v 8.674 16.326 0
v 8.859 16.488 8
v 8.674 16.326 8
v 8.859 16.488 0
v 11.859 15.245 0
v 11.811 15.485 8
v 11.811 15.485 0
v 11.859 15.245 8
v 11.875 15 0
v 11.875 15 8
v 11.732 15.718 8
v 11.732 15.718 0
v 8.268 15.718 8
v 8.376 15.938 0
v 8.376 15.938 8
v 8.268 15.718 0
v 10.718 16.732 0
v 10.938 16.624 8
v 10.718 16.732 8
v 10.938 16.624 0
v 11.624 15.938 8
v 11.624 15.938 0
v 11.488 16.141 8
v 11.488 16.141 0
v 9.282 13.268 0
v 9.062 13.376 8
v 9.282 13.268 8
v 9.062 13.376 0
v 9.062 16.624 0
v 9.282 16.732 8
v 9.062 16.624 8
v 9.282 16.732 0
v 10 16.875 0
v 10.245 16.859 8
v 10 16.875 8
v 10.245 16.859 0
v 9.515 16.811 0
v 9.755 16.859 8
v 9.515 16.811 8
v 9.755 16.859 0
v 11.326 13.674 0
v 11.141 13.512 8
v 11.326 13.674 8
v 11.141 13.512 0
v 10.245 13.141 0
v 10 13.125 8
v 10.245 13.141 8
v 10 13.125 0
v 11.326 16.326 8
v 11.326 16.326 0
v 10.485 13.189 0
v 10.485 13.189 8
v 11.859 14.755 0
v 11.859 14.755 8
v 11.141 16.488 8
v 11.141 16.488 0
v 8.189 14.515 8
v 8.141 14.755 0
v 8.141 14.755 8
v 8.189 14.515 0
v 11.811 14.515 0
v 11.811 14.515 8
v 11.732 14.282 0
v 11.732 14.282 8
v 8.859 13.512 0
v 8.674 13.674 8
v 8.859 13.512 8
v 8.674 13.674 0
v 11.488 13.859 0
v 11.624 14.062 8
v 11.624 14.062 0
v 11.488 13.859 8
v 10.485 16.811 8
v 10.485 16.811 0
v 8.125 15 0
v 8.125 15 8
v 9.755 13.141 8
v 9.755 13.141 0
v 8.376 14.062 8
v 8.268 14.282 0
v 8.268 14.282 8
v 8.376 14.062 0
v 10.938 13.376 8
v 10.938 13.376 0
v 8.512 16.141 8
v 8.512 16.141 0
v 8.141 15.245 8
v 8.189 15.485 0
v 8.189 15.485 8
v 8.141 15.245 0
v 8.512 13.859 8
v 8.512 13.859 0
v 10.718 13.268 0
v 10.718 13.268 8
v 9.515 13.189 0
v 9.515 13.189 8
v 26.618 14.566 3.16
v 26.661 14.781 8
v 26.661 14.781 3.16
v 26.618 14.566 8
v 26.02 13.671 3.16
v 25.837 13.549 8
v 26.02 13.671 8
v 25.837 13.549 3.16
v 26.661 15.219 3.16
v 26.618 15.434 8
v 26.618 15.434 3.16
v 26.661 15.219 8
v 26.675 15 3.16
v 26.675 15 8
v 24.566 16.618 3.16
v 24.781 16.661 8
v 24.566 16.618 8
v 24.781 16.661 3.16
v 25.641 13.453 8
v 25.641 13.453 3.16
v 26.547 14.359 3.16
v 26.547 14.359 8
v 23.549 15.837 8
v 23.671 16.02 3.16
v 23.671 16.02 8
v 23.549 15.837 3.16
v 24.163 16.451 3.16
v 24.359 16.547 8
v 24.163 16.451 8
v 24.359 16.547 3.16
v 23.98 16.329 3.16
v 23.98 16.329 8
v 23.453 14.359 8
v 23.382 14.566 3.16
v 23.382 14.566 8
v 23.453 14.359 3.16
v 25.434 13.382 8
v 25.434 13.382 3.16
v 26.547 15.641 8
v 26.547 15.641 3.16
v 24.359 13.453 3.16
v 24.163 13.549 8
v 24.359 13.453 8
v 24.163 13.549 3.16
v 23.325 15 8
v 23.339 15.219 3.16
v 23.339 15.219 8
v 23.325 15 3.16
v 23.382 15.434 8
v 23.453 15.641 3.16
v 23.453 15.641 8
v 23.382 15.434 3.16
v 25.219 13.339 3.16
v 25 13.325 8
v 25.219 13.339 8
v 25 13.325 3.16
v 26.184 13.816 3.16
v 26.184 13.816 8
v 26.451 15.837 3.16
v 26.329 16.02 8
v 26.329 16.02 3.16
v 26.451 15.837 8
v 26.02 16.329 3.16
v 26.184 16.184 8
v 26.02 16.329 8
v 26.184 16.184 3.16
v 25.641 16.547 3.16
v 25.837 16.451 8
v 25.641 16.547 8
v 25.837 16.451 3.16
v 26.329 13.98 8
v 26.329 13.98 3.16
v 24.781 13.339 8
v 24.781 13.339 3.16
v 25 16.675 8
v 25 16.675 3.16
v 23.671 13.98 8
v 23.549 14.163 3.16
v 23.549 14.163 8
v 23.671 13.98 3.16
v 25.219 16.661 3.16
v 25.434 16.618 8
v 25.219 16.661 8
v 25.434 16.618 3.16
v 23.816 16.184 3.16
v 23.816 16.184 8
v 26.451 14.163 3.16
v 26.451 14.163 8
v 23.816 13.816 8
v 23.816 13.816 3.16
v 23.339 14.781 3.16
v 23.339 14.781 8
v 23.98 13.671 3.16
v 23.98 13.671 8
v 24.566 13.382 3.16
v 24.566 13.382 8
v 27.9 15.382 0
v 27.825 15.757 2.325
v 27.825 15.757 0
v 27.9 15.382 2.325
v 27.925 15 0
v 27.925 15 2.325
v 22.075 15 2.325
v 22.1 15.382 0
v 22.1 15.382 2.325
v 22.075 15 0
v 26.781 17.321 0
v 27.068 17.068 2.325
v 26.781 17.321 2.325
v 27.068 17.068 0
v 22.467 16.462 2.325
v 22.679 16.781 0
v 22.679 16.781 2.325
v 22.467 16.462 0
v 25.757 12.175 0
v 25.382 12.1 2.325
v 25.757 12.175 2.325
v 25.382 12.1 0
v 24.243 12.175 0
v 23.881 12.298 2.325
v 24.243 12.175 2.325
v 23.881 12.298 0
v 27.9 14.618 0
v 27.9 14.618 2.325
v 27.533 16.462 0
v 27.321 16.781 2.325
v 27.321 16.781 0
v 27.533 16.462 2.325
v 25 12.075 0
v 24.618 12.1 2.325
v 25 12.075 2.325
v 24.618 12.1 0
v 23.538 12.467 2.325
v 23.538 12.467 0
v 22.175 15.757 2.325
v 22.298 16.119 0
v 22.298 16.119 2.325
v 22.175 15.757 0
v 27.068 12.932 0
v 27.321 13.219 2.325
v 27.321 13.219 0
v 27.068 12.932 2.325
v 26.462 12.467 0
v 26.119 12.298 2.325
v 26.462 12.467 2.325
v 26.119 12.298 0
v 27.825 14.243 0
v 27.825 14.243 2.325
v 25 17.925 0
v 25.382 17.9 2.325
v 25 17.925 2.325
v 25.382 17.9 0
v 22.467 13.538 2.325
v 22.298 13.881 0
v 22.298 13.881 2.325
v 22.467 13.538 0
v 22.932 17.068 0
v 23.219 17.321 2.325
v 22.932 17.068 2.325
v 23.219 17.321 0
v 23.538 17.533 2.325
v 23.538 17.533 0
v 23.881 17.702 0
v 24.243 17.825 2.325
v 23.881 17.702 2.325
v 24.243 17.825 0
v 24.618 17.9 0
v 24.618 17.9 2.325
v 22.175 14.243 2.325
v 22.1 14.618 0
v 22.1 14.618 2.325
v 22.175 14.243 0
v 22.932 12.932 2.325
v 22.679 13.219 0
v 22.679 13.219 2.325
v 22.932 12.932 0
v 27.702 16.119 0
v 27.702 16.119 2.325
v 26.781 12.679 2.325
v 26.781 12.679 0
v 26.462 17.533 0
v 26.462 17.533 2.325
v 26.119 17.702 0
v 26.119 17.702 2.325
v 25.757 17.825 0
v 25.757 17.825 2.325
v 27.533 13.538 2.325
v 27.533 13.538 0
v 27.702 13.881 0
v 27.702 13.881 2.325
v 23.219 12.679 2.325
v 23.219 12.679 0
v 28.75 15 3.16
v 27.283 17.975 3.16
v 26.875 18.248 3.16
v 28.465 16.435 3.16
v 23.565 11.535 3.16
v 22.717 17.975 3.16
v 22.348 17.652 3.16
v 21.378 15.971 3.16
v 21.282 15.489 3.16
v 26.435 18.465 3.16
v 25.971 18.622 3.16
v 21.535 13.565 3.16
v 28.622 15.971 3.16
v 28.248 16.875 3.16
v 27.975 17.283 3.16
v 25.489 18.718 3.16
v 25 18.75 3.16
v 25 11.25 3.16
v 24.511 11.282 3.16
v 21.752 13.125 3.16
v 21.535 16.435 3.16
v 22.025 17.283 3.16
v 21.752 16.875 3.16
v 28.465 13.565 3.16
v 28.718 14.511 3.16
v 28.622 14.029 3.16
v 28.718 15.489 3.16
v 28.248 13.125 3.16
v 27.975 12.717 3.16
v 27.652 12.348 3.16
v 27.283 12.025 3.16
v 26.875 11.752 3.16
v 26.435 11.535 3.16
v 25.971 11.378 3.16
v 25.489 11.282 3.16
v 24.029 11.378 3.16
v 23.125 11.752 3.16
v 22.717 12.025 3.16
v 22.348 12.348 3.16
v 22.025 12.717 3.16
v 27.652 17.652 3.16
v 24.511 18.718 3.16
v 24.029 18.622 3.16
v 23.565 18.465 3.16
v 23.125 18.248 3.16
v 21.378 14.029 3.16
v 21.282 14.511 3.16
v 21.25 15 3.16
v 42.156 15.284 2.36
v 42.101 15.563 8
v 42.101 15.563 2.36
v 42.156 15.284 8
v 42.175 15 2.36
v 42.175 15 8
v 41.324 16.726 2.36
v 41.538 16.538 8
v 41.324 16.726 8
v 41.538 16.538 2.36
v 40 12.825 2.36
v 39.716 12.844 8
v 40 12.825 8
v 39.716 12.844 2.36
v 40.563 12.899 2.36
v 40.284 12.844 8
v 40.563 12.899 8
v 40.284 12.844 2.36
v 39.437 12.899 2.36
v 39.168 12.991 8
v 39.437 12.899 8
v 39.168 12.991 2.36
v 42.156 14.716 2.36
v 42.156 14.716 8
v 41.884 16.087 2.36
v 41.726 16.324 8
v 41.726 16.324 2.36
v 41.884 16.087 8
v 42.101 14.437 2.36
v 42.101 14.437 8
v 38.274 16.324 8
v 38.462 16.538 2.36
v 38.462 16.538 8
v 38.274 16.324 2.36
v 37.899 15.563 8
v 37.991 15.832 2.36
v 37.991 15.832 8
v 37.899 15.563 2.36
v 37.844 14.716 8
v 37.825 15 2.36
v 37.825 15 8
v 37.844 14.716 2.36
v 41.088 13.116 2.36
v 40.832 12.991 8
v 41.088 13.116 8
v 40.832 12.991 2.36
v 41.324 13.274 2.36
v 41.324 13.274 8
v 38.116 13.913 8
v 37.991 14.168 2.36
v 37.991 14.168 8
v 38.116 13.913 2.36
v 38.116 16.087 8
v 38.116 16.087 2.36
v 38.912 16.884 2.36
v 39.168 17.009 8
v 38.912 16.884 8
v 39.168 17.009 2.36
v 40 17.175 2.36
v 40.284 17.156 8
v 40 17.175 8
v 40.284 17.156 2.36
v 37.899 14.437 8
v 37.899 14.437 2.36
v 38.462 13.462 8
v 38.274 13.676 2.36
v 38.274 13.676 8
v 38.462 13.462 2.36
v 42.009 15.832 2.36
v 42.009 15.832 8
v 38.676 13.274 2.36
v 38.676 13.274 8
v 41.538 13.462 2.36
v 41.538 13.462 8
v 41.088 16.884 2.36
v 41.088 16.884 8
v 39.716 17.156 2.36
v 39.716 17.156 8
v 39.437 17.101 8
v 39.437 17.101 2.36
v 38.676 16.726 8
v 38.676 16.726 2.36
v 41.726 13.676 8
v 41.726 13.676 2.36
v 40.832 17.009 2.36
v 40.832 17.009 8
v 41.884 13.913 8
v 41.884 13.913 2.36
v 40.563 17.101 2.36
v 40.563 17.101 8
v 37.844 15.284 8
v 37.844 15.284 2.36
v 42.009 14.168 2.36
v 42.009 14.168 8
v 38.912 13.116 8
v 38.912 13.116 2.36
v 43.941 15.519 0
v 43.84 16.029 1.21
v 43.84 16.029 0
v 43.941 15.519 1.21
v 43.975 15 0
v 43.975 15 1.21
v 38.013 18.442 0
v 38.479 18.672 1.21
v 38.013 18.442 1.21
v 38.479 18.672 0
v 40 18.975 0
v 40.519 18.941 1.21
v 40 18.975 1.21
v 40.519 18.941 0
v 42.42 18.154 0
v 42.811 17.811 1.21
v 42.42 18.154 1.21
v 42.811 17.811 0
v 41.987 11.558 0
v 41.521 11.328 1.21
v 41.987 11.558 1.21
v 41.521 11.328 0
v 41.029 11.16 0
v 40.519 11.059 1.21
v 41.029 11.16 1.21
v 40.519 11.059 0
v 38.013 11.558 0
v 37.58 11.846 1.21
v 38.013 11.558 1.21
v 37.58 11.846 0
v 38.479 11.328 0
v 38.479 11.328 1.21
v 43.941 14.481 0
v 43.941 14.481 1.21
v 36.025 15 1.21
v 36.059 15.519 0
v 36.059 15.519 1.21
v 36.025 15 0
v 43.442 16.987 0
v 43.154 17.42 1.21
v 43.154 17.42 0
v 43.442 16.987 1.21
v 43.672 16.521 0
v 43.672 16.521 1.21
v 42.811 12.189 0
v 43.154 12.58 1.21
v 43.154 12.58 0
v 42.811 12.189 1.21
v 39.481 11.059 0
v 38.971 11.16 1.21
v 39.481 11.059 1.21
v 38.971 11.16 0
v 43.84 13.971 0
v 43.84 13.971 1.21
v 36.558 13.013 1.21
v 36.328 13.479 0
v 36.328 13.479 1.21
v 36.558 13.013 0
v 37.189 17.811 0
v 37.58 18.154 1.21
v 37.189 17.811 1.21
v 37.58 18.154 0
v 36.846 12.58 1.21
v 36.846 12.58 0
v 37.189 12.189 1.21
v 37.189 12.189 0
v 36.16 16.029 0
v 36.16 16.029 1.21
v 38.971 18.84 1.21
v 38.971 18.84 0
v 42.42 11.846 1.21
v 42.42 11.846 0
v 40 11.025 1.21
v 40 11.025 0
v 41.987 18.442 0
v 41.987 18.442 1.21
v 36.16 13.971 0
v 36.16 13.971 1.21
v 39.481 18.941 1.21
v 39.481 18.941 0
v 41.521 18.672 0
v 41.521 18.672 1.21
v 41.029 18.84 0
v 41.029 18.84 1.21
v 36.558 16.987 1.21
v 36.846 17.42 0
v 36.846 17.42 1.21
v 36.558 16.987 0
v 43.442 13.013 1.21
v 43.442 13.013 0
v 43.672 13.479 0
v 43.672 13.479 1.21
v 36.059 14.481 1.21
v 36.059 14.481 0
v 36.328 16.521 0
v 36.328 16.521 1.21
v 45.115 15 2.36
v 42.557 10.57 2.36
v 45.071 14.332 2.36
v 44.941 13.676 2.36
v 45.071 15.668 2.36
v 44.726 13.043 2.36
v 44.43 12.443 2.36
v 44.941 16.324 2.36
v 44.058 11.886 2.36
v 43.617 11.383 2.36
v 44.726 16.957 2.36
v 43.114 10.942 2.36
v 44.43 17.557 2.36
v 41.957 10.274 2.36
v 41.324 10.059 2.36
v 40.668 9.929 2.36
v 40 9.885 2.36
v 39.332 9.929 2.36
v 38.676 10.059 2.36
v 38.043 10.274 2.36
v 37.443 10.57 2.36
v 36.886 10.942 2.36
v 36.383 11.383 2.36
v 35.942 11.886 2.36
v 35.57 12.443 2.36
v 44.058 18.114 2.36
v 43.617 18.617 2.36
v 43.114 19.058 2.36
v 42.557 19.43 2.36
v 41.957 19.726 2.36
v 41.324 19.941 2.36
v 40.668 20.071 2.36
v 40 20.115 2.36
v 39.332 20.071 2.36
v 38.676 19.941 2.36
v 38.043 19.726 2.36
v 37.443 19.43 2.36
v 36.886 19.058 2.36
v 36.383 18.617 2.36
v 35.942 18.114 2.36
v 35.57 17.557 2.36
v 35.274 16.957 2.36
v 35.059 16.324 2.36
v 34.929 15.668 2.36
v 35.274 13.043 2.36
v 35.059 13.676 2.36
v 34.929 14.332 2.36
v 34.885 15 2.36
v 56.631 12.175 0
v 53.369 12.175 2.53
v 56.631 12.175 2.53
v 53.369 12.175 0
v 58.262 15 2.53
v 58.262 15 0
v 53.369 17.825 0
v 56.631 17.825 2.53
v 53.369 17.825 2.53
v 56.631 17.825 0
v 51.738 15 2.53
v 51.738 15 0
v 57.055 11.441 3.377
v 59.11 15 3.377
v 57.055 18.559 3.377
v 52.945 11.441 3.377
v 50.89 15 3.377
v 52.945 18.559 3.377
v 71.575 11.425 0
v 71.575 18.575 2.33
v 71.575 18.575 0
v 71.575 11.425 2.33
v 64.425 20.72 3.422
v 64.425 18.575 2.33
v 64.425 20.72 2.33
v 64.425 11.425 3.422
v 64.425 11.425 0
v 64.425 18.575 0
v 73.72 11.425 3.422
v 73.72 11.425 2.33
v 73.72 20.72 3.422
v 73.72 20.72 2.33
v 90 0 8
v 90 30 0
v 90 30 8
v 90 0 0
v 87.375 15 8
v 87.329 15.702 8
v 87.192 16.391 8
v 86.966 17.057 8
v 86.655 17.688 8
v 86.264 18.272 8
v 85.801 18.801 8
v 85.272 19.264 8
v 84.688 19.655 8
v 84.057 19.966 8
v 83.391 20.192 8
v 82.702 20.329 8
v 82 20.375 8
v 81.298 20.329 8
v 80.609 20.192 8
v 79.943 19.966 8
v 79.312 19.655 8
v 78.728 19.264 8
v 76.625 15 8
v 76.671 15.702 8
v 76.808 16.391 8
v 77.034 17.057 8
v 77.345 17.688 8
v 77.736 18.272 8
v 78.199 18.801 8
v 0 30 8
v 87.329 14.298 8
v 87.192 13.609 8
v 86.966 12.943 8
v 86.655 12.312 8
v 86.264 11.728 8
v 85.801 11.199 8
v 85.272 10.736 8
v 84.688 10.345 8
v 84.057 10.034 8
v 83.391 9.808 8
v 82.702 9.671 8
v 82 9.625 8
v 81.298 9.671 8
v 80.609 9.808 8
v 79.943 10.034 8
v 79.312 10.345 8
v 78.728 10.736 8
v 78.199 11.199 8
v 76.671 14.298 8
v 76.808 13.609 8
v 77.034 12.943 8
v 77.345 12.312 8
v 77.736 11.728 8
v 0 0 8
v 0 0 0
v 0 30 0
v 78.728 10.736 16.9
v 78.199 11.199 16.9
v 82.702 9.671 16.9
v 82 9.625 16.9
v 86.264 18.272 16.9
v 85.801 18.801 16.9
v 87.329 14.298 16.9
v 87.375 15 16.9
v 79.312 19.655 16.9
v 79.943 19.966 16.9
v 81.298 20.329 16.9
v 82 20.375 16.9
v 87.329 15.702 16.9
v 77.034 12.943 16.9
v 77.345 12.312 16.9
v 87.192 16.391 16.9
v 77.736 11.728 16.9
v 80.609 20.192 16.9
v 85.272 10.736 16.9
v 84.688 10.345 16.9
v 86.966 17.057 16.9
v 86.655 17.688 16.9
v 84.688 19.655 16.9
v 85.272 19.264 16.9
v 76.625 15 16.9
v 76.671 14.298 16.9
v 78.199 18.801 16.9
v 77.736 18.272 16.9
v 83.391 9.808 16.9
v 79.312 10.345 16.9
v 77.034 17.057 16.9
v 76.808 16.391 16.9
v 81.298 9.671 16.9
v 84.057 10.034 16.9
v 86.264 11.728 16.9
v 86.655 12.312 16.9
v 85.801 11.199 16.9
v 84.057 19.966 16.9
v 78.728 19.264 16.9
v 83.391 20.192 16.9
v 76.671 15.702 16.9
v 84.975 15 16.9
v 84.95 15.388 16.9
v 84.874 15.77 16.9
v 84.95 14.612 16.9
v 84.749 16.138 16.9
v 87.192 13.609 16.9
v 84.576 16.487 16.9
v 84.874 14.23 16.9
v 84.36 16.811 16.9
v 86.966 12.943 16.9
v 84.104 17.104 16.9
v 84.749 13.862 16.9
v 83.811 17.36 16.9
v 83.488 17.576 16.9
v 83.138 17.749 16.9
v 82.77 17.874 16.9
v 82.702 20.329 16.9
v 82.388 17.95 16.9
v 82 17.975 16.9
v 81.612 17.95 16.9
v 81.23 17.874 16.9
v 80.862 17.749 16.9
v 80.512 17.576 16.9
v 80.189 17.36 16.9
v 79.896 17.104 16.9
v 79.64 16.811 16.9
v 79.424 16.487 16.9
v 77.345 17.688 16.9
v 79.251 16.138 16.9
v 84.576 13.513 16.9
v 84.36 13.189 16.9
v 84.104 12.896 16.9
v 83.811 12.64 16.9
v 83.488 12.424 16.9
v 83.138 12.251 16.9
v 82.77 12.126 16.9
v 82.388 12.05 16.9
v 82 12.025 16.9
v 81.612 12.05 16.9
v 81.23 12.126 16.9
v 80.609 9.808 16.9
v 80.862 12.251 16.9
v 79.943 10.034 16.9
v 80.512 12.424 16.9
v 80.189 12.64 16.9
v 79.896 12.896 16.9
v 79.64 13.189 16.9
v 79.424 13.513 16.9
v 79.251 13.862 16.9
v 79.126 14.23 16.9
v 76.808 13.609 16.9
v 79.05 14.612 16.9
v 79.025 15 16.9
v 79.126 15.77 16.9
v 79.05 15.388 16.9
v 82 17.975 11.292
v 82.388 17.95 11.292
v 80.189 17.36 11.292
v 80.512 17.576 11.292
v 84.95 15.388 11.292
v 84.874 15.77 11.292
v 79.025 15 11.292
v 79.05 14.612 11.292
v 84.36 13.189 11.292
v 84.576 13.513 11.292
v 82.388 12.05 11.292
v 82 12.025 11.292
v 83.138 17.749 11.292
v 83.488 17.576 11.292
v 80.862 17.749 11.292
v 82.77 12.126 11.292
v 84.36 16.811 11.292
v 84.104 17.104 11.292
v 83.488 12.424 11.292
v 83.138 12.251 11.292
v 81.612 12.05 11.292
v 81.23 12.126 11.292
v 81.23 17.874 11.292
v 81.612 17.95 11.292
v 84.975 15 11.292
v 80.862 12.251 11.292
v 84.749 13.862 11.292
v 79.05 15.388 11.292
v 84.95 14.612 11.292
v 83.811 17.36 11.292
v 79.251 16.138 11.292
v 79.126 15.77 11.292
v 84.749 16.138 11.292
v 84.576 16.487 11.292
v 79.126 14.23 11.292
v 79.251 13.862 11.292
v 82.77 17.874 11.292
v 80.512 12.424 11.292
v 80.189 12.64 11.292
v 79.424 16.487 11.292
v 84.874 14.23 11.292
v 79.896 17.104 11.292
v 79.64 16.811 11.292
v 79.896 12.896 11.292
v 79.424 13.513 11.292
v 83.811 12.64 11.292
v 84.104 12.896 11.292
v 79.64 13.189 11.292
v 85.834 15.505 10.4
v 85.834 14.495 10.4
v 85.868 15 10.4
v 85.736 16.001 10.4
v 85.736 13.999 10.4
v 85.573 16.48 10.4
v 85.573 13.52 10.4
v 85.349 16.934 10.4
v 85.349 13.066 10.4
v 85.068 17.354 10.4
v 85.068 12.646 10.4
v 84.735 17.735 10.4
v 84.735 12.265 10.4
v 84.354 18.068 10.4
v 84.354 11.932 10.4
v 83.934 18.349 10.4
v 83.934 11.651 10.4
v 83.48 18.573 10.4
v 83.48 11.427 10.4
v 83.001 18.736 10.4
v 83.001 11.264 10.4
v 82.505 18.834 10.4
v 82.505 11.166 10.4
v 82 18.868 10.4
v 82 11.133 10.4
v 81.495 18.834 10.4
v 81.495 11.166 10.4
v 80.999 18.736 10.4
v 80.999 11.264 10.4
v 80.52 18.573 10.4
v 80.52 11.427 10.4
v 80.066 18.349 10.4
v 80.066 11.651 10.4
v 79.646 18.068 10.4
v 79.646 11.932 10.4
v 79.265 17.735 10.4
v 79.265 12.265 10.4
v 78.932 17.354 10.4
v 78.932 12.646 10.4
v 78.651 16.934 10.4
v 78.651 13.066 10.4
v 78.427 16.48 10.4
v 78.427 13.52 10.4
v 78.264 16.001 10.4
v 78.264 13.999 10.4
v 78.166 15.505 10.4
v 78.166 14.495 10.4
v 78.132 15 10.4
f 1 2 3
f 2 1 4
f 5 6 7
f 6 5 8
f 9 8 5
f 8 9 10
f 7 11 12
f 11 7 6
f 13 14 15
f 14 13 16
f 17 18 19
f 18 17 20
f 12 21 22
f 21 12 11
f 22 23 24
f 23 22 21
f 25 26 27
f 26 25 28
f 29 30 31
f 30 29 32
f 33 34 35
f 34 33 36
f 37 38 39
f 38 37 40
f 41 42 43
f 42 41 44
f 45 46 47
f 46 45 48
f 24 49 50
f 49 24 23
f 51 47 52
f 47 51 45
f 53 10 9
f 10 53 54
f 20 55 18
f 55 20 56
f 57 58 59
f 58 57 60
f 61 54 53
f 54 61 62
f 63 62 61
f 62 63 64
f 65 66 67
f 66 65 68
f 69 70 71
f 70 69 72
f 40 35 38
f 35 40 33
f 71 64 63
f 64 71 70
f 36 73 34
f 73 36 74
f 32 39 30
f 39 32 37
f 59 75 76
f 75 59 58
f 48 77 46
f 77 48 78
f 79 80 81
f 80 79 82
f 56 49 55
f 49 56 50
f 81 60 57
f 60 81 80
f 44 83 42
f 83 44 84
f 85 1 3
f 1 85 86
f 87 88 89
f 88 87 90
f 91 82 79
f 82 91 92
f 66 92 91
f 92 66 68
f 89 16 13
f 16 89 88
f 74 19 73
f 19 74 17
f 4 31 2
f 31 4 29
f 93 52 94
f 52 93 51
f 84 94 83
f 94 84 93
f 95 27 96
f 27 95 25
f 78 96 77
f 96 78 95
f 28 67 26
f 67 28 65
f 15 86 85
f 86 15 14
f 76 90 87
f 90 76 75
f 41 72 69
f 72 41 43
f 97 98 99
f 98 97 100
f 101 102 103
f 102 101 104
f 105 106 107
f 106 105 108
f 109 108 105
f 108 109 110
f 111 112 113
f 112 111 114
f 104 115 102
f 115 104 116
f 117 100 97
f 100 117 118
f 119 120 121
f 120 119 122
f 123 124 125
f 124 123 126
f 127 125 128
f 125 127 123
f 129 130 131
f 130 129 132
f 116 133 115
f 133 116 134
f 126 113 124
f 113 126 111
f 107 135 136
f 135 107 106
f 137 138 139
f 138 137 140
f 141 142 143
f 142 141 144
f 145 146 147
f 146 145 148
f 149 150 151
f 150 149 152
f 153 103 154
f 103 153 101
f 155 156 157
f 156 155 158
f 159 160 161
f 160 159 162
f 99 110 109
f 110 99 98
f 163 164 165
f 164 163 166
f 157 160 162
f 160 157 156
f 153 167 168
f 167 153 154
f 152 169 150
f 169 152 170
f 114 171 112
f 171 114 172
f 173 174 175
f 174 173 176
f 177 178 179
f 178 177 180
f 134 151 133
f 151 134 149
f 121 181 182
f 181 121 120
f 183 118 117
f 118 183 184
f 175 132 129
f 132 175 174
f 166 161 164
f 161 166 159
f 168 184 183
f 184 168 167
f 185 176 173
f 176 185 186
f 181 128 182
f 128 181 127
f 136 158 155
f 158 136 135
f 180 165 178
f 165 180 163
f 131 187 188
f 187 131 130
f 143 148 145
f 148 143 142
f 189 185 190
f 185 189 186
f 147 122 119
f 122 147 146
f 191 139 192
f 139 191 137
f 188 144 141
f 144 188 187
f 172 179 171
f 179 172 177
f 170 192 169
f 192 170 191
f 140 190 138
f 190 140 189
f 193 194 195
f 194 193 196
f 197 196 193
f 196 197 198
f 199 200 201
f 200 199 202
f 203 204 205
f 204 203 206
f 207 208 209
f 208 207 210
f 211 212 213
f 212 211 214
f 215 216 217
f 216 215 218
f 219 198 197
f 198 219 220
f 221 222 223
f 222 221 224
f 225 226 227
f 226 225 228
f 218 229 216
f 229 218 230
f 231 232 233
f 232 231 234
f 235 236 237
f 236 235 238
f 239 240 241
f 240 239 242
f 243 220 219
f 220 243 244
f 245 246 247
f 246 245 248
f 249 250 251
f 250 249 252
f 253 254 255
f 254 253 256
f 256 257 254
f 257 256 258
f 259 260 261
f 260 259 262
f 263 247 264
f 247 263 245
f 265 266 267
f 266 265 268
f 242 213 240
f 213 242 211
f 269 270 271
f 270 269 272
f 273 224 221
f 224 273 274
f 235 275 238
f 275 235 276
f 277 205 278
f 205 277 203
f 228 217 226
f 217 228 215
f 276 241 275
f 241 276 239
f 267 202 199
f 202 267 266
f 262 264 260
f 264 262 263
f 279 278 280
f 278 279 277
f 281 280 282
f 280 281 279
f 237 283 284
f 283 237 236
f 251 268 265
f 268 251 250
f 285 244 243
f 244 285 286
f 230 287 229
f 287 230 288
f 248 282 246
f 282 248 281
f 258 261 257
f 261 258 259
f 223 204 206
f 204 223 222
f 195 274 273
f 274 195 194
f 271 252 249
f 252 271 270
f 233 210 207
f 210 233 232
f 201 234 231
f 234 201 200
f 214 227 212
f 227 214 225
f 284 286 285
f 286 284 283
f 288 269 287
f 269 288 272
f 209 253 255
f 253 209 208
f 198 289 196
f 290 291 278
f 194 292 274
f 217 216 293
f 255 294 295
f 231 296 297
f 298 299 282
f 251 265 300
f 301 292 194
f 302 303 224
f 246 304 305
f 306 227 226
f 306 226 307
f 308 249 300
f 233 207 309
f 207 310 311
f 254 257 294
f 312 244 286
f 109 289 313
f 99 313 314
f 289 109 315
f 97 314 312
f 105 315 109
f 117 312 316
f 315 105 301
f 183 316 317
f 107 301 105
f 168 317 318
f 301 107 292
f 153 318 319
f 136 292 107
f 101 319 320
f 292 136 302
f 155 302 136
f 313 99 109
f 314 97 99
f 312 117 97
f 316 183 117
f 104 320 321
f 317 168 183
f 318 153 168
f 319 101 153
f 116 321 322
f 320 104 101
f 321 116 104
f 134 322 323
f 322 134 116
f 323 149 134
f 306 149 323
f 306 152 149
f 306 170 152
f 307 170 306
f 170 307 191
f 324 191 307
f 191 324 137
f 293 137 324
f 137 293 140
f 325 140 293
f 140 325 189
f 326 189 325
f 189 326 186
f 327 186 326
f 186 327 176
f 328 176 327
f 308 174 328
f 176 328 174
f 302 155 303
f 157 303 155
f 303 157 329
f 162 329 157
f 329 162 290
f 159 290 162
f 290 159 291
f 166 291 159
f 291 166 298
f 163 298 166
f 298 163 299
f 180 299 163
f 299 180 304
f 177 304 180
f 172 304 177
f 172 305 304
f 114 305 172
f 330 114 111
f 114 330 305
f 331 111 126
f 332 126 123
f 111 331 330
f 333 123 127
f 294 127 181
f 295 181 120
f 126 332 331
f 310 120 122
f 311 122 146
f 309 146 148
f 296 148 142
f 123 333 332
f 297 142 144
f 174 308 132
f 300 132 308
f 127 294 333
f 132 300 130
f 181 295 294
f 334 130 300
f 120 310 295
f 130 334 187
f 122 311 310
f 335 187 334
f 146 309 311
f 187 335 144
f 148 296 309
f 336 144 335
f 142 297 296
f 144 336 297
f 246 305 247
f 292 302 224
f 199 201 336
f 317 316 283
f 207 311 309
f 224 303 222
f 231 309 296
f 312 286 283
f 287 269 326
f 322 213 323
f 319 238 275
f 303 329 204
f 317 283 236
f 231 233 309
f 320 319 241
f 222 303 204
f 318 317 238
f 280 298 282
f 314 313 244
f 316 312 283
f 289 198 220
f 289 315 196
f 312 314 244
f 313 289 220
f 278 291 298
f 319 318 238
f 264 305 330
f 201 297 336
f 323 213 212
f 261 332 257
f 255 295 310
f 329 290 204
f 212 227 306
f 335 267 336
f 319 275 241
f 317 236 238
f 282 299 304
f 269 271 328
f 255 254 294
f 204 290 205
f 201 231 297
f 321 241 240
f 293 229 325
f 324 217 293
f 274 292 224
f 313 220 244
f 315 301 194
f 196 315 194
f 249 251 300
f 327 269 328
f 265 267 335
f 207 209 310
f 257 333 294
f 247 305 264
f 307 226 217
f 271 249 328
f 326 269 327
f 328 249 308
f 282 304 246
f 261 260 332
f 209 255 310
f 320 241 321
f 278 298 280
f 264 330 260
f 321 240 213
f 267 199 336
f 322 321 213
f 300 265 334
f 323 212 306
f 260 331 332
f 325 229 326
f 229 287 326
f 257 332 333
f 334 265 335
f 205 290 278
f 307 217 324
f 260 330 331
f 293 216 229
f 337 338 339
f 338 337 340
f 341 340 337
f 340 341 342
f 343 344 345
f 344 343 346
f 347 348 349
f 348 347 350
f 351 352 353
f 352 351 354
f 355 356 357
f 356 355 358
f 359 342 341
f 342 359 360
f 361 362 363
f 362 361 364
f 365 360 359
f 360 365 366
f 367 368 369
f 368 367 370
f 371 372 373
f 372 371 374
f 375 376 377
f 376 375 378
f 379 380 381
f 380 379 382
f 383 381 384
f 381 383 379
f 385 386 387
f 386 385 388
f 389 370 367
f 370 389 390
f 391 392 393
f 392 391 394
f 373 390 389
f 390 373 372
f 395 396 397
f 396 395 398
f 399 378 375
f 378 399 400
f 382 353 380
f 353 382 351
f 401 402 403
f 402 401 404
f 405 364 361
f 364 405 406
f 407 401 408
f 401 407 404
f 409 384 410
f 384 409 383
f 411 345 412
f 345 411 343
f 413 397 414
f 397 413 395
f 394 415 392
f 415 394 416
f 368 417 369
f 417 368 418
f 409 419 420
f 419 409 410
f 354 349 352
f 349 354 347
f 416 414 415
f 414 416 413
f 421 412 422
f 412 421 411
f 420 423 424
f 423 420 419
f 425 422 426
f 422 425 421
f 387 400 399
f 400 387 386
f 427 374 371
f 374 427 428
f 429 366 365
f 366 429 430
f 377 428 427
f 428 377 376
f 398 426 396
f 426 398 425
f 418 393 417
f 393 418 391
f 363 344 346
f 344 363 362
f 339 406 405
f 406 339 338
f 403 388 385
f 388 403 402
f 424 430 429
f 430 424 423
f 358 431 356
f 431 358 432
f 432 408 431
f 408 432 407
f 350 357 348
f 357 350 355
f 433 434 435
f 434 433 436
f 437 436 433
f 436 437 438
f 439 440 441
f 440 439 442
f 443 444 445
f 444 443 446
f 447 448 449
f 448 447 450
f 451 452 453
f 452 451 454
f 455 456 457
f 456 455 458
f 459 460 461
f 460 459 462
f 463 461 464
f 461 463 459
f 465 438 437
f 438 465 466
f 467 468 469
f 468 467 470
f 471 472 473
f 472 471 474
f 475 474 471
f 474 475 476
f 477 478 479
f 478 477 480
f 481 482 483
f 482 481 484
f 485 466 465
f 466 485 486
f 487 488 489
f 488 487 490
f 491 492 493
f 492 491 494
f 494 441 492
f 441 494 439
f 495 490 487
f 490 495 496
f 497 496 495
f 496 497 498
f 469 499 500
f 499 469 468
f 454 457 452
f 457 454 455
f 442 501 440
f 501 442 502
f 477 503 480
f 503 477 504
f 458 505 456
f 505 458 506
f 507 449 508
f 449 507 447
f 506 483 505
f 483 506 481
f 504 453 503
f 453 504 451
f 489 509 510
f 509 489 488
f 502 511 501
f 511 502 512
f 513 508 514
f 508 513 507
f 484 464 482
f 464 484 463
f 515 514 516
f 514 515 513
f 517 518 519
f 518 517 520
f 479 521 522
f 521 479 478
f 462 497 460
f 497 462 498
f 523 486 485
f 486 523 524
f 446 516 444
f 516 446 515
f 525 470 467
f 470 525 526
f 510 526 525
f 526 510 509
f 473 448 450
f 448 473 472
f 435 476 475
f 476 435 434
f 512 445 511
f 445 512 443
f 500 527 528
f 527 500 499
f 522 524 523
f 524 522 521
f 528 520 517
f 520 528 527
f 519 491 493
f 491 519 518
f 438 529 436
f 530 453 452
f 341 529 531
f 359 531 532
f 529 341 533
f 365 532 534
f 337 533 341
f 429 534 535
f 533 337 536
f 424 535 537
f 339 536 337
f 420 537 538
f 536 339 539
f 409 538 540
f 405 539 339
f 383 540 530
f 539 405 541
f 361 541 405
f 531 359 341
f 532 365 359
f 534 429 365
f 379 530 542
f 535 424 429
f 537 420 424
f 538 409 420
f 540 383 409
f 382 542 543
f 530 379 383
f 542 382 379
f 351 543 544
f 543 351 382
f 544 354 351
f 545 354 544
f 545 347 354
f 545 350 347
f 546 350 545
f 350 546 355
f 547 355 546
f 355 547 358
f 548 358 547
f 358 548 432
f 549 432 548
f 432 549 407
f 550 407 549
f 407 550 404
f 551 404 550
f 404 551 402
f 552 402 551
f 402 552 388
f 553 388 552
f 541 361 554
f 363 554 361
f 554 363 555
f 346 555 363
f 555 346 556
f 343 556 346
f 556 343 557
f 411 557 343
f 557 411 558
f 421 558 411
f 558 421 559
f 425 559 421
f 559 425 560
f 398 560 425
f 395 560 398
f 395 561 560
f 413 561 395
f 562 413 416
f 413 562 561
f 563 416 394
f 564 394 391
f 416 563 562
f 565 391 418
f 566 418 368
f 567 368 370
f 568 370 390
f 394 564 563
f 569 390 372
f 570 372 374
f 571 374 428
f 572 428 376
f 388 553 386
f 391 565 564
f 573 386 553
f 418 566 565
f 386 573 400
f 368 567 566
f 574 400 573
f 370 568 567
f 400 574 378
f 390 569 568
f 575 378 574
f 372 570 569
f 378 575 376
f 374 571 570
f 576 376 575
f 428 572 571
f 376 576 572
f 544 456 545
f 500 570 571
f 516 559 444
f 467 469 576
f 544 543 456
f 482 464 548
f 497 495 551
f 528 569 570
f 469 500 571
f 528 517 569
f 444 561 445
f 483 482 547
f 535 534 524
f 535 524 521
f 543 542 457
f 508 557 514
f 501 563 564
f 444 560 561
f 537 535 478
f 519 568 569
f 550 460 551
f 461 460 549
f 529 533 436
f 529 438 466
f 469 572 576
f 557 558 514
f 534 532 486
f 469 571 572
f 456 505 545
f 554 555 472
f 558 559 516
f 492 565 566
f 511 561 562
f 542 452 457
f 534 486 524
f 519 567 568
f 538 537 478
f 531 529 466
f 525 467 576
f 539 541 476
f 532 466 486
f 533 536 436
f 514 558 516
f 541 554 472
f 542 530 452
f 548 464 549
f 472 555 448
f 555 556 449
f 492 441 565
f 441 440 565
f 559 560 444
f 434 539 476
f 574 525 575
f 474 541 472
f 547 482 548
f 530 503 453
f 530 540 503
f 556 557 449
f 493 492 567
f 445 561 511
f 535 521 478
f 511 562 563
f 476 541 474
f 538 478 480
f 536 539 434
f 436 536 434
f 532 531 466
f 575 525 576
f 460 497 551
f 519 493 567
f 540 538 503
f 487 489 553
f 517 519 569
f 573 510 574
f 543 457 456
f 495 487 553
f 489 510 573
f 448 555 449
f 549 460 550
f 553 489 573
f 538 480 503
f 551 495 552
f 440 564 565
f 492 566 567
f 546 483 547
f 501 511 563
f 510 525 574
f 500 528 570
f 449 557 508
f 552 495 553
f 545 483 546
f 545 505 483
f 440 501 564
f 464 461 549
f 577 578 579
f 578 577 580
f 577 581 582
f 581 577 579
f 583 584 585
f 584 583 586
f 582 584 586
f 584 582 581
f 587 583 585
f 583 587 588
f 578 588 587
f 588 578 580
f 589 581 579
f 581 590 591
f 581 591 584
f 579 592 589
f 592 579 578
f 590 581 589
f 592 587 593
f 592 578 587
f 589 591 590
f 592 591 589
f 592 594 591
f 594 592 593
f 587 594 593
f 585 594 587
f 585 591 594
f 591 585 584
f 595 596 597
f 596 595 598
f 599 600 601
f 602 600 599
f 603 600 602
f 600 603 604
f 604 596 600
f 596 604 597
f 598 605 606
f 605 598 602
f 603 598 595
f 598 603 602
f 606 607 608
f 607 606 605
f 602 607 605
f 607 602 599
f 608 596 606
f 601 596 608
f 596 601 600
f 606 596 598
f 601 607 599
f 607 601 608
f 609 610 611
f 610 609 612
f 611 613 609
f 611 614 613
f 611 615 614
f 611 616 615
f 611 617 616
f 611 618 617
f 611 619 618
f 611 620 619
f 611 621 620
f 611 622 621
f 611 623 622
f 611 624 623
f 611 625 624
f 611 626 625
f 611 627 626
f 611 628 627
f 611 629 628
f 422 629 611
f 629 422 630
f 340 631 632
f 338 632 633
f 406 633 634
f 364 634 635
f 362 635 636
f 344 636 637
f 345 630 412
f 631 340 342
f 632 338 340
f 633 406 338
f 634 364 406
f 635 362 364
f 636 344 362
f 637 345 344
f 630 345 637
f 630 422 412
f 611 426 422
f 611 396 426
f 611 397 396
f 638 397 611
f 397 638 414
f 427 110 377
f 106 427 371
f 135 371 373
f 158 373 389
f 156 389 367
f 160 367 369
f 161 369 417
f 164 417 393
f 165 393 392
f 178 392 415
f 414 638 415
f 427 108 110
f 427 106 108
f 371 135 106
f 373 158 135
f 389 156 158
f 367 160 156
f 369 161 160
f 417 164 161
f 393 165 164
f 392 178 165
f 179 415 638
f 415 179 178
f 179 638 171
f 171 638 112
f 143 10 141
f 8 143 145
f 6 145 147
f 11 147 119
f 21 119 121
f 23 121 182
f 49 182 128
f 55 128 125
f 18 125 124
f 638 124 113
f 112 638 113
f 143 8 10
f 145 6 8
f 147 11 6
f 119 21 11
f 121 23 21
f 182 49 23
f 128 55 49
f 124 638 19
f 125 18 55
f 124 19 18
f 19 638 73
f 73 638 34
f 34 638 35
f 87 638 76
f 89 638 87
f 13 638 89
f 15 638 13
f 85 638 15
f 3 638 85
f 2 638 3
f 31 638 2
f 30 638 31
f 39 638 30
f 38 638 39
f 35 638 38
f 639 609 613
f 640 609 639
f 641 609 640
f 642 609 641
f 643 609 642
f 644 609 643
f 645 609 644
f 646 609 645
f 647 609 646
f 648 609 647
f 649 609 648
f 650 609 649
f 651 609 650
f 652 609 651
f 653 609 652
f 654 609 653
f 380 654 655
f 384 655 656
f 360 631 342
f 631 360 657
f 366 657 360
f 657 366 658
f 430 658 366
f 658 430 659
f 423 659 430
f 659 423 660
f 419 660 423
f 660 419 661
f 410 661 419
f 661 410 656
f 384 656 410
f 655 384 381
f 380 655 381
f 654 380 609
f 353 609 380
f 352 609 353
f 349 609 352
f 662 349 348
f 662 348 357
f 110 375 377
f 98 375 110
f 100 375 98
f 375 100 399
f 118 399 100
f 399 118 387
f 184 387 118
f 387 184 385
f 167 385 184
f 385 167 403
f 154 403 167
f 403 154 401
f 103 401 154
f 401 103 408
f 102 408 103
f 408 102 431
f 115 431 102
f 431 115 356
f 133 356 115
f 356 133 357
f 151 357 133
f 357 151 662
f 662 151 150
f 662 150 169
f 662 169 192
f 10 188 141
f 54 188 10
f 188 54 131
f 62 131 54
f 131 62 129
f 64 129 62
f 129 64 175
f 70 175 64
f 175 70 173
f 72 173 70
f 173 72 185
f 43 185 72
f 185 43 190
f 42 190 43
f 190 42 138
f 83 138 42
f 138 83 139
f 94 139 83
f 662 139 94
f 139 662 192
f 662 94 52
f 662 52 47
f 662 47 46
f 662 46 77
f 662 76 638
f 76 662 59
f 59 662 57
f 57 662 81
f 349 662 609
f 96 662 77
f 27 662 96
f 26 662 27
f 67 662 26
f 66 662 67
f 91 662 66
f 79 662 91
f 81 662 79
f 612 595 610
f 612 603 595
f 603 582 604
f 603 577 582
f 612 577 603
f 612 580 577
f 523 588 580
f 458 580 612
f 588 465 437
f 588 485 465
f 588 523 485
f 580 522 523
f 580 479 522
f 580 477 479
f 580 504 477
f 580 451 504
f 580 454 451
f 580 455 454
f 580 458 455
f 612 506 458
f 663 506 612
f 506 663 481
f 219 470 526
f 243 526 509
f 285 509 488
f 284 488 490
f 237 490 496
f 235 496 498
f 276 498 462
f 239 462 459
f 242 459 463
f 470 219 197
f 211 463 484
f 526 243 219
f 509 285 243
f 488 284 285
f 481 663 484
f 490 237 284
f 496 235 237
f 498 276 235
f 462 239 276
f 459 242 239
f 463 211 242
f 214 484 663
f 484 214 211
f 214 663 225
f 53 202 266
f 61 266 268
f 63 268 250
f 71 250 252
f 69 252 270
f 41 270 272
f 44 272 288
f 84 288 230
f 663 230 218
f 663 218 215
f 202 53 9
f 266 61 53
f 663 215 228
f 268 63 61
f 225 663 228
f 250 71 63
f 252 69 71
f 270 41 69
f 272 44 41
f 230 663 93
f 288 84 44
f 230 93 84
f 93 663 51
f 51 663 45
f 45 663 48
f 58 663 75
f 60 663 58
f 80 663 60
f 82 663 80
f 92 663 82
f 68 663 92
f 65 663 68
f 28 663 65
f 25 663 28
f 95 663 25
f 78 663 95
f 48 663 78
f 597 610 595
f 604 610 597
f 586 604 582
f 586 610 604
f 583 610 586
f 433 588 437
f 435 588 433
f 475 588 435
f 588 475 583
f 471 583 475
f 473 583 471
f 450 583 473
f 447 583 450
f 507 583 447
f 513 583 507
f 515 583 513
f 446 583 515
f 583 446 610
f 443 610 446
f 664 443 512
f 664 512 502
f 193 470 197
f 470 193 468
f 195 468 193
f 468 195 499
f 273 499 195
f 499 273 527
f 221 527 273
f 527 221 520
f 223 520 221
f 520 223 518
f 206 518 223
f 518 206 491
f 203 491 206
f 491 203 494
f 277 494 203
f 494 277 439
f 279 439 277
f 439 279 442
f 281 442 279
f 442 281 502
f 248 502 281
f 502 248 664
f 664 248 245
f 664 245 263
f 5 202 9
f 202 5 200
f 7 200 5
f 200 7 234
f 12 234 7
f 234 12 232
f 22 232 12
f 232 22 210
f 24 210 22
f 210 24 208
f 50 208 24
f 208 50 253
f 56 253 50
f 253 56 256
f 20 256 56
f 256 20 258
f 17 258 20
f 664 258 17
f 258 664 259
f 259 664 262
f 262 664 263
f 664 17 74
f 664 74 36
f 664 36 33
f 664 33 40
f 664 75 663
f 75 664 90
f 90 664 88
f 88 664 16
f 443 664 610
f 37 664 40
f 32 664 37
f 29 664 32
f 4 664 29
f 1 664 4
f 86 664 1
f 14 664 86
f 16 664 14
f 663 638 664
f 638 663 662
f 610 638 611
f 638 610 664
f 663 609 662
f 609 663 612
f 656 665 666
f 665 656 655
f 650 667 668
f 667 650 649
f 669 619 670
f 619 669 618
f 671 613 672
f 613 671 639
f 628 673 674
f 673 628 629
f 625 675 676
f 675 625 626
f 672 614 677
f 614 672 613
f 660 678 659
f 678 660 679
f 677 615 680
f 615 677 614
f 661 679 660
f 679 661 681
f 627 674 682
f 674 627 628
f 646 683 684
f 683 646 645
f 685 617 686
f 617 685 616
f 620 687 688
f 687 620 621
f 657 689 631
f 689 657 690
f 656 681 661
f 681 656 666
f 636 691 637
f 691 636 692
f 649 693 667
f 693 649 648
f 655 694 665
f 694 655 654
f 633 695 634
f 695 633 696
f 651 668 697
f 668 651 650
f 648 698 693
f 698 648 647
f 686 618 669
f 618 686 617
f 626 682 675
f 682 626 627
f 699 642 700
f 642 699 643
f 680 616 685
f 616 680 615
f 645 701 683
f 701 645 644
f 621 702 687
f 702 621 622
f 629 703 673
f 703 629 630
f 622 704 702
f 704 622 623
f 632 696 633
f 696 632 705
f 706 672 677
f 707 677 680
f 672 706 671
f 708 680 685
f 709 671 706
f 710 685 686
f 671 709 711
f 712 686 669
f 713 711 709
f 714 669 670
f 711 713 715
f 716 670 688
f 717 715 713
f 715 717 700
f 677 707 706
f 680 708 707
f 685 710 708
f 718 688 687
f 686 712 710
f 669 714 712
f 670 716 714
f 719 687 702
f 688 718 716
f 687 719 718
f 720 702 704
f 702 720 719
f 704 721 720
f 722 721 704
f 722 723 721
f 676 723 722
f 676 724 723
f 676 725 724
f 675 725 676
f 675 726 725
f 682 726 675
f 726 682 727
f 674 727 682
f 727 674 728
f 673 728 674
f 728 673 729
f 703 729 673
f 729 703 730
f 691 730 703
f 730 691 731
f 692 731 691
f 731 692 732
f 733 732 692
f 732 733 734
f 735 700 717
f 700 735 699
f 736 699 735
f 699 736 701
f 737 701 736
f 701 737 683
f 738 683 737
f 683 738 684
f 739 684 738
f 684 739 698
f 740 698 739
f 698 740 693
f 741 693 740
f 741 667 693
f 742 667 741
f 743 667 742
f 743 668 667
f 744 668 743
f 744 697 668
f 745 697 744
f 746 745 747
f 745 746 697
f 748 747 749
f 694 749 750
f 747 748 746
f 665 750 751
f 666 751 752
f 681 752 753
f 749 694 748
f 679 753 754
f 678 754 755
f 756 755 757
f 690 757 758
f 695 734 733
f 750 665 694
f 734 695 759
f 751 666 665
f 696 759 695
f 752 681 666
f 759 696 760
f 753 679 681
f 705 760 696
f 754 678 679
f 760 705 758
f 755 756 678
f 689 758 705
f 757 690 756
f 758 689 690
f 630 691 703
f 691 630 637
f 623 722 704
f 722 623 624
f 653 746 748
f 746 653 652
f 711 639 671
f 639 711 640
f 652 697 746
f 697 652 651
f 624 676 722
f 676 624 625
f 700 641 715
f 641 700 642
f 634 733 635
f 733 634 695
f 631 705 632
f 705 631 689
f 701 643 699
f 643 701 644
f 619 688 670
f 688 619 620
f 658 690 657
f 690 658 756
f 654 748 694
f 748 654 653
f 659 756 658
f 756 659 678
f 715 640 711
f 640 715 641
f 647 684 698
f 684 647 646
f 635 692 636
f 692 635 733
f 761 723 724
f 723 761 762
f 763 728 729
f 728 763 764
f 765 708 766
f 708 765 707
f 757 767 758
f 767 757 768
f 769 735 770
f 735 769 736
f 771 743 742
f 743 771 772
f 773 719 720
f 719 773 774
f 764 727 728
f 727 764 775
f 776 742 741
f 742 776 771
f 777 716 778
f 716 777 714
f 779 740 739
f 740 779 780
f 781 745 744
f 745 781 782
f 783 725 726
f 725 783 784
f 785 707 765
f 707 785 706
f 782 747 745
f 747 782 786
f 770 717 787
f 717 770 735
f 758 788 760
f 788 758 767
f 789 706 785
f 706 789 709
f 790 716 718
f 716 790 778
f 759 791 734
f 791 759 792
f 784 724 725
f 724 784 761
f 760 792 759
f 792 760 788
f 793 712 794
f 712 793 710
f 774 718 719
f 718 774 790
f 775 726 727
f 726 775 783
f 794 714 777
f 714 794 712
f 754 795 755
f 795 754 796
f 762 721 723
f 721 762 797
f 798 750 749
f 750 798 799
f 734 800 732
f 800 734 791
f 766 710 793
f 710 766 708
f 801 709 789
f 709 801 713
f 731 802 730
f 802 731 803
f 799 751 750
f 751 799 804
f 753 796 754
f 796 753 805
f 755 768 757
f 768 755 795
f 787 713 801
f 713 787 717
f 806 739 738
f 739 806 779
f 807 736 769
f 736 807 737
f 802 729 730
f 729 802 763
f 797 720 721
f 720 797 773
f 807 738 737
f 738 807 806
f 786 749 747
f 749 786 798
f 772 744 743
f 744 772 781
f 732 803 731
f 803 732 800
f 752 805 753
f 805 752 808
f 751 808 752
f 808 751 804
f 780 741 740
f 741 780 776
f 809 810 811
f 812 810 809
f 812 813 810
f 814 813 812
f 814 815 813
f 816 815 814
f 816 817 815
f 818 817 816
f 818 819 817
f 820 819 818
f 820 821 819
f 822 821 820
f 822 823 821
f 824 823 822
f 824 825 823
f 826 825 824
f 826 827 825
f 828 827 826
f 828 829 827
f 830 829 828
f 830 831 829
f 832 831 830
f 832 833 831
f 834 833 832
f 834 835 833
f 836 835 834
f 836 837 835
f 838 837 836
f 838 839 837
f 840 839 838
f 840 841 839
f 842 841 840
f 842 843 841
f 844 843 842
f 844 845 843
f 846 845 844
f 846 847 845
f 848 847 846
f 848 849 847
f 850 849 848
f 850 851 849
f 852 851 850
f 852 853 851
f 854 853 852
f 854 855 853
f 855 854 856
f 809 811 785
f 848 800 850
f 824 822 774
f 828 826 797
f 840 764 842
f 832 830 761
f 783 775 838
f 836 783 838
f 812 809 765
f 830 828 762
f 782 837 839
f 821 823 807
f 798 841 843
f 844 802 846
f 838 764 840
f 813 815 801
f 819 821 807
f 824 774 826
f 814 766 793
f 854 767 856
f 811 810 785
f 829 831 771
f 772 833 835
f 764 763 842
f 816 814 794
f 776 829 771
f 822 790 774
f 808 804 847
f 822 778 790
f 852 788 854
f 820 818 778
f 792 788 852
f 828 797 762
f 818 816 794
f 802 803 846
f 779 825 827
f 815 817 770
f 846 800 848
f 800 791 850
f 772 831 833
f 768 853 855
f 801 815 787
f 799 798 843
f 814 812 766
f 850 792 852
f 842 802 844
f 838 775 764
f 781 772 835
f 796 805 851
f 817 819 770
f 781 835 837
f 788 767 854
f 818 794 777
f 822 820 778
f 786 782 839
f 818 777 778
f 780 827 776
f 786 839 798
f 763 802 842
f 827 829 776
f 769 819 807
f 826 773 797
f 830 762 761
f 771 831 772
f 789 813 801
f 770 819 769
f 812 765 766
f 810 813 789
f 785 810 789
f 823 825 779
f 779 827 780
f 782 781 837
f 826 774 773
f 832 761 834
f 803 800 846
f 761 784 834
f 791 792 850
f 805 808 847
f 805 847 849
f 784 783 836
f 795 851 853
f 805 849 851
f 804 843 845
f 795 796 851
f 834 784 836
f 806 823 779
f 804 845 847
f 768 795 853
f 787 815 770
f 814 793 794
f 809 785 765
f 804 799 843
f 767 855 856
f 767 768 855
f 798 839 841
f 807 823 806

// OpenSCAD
// file: iso_metric_fasteners.consts.scad
// GENERATED from spec.json by scripts/gen-consts.mjs — DO NOT EDIT.
// interface: iso_metric_fasteners v0.1.0

M2__THREAD = 2;
M2__HOLE_CLEAR = 2.4;
M2__CAP_D = 3.8;
M2__CAP_K = 2;
M2__BTN_D = 3.8;
M2__BTN_K = 1.3;
M2__NUT_AF = 4;
M2__NUT_M = 1.6;
M2__SQ_AF = 4;
M2__SQ_M = 1.2;
M2__INSERT_OD = 3.2;
M2__INSERT_LEN = 3;
M2_5__THREAD = 2.5;
M2_5__HOLE_CLEAR = 2.9;
M2_5__CAP_D = 4.5;
M2_5__CAP_K = 2.5;
M2_5__BTN_D = 4.6;
M2_5__BTN_K = 1.5;
M2_5__NUT_AF = 5;
M2_5__NUT_M = 2;
M2_5__SQ_AF = 5;
M2_5__SQ_M = 1.6;
M2_5__INSERT_OD = 3.6;
M2_5__INSERT_LEN = 3.5;
M3__THREAD = 3;
M3__HOLE_CLEAR = 3.4;
M3__CAP_D = 5.5;
M3__CAP_K = 3;
M3__BTN_D = 5.7;
M3__BTN_K = 1.65;
M3__NUT_AF = 5.5;
M3__NUT_M = 2.4;
M3__SQ_AF = 5.5;
M3__SQ_M = 1.8;
M3__INSERT_OD = 4.6;
M3__INSERT_LEN = 5;
M4__THREAD = 4;
M4__HOLE_CLEAR = 4.5;
M4__CAP_D = 7;
M4__CAP_K = 4;
M4__BTN_D = 7.6;
M4__BTN_K = 2.2;
M4__NUT_AF = 7;
M4__NUT_M = 3.2;
M4__SQ_AF = 7;
M4__SQ_M = 2.2;
M4__INSERT_OD = 6;
M4__INSERT_LEN = 6.5;
M5__THREAD = 5;
M5__HOLE_CLEAR = 5.5;
M5__CAP_D = 8.5;
M5__CAP_K = 5;
M5__BTN_D = 8.8;
M5__BTN_K = 2.5;
M5__NUT_AF = 8;
M5__NUT_M = 4.7;
M5__SQ_AF = 8;
M5__SQ_M = 2.7;
M5__INSERT_OD = 7;
M5__INSERT_LEN = 7.5;
M6__THREAD = 6;
M6__HOLE_CLEAR = 6.6;
M6__CAP_D = 10;
M6__CAP_K = 6;
M6__BTN_D = 10.5;
M6__BTN_K = 3;
M6__NUT_AF = 10;
M6__NUT_M = 5.2;
M6__SQ_AF = 10;
M6__SQ_M = 3.2;
M6__INSERT_OD = 8;
M6__INSERT_LEN = 9;
// file: ../../lib/asm.scad
// ============================================================================
// lib/asm.scad — typed mating features, mirroring the engine's assembly.scad
// ----------------------------------------------------------------------------
// Same signatures, same geometry language, same conventions as the main
// engine (Procedura lib/assembly.scad):
//   * MALE / additive solids  (asm_peg)   -> union() onto the part.
//   * FEMALE / negative tools (asm_socket) -> subtract from the part.
//   * every male tip and female mouth carries a lead-in chamfer so parts
//     self-centre as they seat.
//   * male and female pair from ONE shared nominal + signed fit offset.
// The fit values come from lib/fits.scad — nothing here owns a tolerance.

include <fits.scad>;

// ---- peg ↔ socket ----------------------------------------------------------
// MALE peg, base at origin, growing +Z, chamfered self-centring tip.
module asm_peg(d, len) {
    lead = fit_lead(d);
    union() {
        cylinder(h = max(0.01, len - lead), d = d);
        translate([0, 0, len - lead])
            cylinder(h = lead, d1 = d, d2 = max(0.2, d - 2 * lead));
    }
}

// FEMALE socket, cut from the SAME nominal as its peg. Bore grows with the
// fit class; mouth chamfer eases insertion.
module asm_socket(d, depth, cls = "location") {
    bore = fit_d(d, cls);
    lead = fit_lead(bore);
    union() {
        translate([0, 0, -0.01]) cylinder(h = depth + 0.02, d = bore);
        translate([0, 0, depth - lead])
            cylinder(h = lead + 0.01, d1 = bore, d2 = bore + 2 * lead);
    }
}

// ---- through hole / counterbore --------------------------------------------
// Plain through hole for a fastener of nominal thread d, ISO-273-style.
module asm_through_hole(d, cls = "clearance") {
    bore = fit_d(d, cls);
    lead = fit_lead(bore);
    union() {
        translate([0, 0, -0.01]) cylinder(h = 100000, d = bore, center = false);
        // both mouths chamfered
        translate([0, 0, -0.01 + 100000 - 0.01]) cylinder(h = lead, d1 = bore, d2 = bore + 2 * lead);
    }
}

// Counterbore for a cap/button head: head pocket + shank clearance, both
// derived from the same nominal head diameter and thread.
module asm_counterbore(head_d, head_k, thread_d, cls = "clearance") {
    lead = fit_lead(head_d);
    union() {
        asm_through_hole(thread_d, cls);
        translate([0, 0, -0.01])
            cylinder(h = head_k + fit_delta_d("location"), d = fit_d(head_d, cls));
        translate([0, 0, head_k + fit_delta_d("location") - lead])
            cylinder(h = lead + 0.01, d1 = fit_d(head_d, cls), d2 = fit_d(head_d, cls) + 2 * lead);
    }
}

// ---- nut traps ---------------------------------------------------------------
// Hex nut trap: across-flats s, nut thickness m, from the SAME s.
// Oriented flat-down, opening at -Z (subtract from the part's underside).
module asm_hex_nut_trap(s, m, cls = "location") {
    af = fit_d(s, cls);
    translate([0, 0, -0.01]) {
        cylinder(h = m + fit_delta_d("location") + 0.01, d = af / cos(30), $fn = 6);
        // lead-in on the outer mouth (deeper into the part is -Z here)
        translate([0, 0, m + fit_delta_d("location") - 0.01])
            cylinder(h = fit_lead(af), d1 = af / cos(30), d2 = af / cos(30) + 2 * fit_lead(af), $fn = 6);
    }
}

// Square nut trap: side s, thickness m.
module asm_square_nut_trap(s, m, cls = "location") {
    side = fit_d(s, cls);
    lead = fit_lead(side);
    translate([0, 0, -0.01]) {
        translate([-side / 2, -side / 2, 0])
            cube([side, side, m + fit_delta_d("location") + 0.01]);
        translate([-side / 2, -side / 2, m + fit_delta_d("location") - 0.01])
            cube([side + 2 * lead, side + 2 * lead, lead + 0.02]);
    }
}

// ---- heat-set insert boss -----------------------------------------------------
// Solid boss (MALE — union it on): outer bore holds a brass insert of
// insert_od/insert_len; the top is counterbored so the insert sits flush.
module asm_insert_boss(insert_od, insert_len, wall = 2.4, cls = "snug") {
    bore = fit_d(insert_od, cls);
    od = bore + 2 * wall;
    difference() {
        cylinder(d = od, h = insert_len + wall);
        translate([0, 0, wall])
            cylinder(d = bore, h = insert_len + 0.01);
        // entry chamfer at the insert mouth
        translate([0, 0, wall - fit_lead(bore) + fit_lead(bore)])
            cylinder(h = fit_lead(bore), d1 = bore + 2 * fit_lead(bore), d2 = bore);
    }
}
// file: ../../lib/fits.scad
// ============================================================================
// lib/fits.scad — fit classes and the tolerance table
// ----------------------------------------------------------------------------
// Every mating feature in this library derives its clearance from THIS table,
// never from a second literal. Mirrors the engine's assembly.scad convention
// (asm_socket bore = nominal + signed fit offset) with the engine's class
// names aliased for compatibility ("press" == "snug").
//
// !! STARTING HYPOTHESES, NOT MEASUREMENTS !!
// These are diametral deltas for a 0.4 mm-nozzle FDM printer, PLA, default
// wall settings. They are corrected by physically printing each interface's
// gauge.scad and recording which class actually fits — see README § gauges.
// Until those prints happen and the table is updated, treat every generated
// fit as provisional.

// Diametral offsets (mm), keyed by class. Radial = half these values.
fit_delta = [
  ["clearance", 0.35],  // slides freely
  ["location",  0.15],  // assembles by hand, no slop
  ["snug",     -0.05],  // press fit, needs force
  ["press",    -0.05],  // engine alias for snug
  ["snap",      0.20],  // engine class kept for compatibility
];

function fit_delta_d(cls) =
    let (hit = [for (e = fit_delta) if (e[0] == cls) e[1]])
    len(hit) == 1 ? hit[0]
  : assert(false, str("unknown fit class '", cls, "'")) 0;

// Radial offset — the engine's asm_fit convention (asm_socket adds 2× this).
function fit_delta_r(cls) = fit_delta_d(cls) / 2;

// Resolve a nominal through a fit class: the ONE place tolerances enter.
function fit_d(nominal, cls) = nominal + fit_delta_d(cls);

// Lead-in chamfer length for a feature of diameter d — self-centring mouth.
// Same formula as the engine (max(0.6, 0.15*d)) so parts generated against
// either library seat identically.
function fit_lead(d) = max(0.6, 0.15 * d);
// file: iso_metric_fasteners.scad
// ============================================================================
// interfaces/iso_metric_fasteners/iso_metric_fasteners.scad
// ----------------------------------------------------------------------------
// ISO metric fastener features for M2–M6, keyed by size. All numbers come
// from <id>.consts.scad (GENERATED from spec.json — edit spec.json, not this).
// Mating geometry is built from lib/asm.scad, so tolerances come from
// lib/fits.scad and never appear here as literals.

use <../../lib/fits.scad>;
use <../../lib/asm.scad>;
include <iso_metric_fasteners.consts.scad>;

// ---- size key lookup -------------------------------------------------------
function _fsz(size) =
    size == "m2"   ? [M2__THREAD,   M2__HOLE_CLEAR,   M2__CAP_D,   M2__CAP_K,   M2__BTN_D,   M2__BTN_K,   M2__NUT_AF,   M2__NUT_M,   M2__SQ_AF,   M2__SQ_M,   M2__INSERT_OD,   M2__INSERT_LEN] :
    size == "m2_5" ? [M2_5__THREAD, M2_5__HOLE_CLEAR, M2_5__CAP_D, M2_5__CAP_K, M2_5__BTN_D, M2_5__BTN_K, M2_5__NUT_AF, M2_5__NUT_M, M2_5__SQ_AF, M2_5__SQ_M, M2_5__INSERT_OD, M2_5__INSERT_LEN] :
    size == "m3"   ? [M3__THREAD,   M3__HOLE_CLEAR,   M3__CAP_D,   M3__CAP_K,   M3__BTN_D,   M3__BTN_K,   M3__NUT_AF,   M3__NUT_M,   M3__SQ_AF,   M3__SQ_M,   M3__INSERT_OD,   M3__INSERT_LEN] :
    size == "m4"   ? [M4__THREAD,   M4__HOLE_CLEAR,   M4__CAP_D,   M4__CAP_K,   M4__BTN_D,   M4__BTN_K,   M4__NUT_AF,   M4__NUT_M,   M4__SQ_AF,   M4__SQ_M,   M4__INSERT_OD,   M4__INSERT_LEN] :
    size == "m5"   ? [M5__THREAD,   M5__HOLE_CLEAR,   M5__CAP_D,   M5__CAP_K,   M5__BTN_D,   M5__BTN_K,   M5__NUT_AF,   M5__NUT_M,   M5__SQ_AF,   M5__SQ_M,   M5__INSERT_OD,   M5__INSERT_LEN] :
    size == "m6"   ? [M6__THREAD,   M6__HOLE_CLEAR,   M6__CAP_D,   M6__CAP_K,   M6__BTN_D,   M6__BTN_K,   M6__NUT_AF,   M6__NUT_M,   M6__SQ_AF,   M6__SQ_M,   M6__INSERT_OD,   M6__INSERT_LEN] :
    assert(false, str("unknown size '", size, "'")) [];

// ---- features (FEMALE tools subtract; MALE solids union) ---------------------

// ISO-273 normal clearance through hole.
module fastener_through_hole(size, cls = "clearance") {
    asm_through_hole(_fsz(size)[1]);
}

// ISO 4762 socket-head-cap counterbore, opening at z=0 going up.
module fastener_cap_counterbore(size, cls = "clearance") {
    s = _fsz(size);
    asm_counterbore(s[2], s[3], s[0], cls);
}

// ISO 7380-1 button-head counterbore.
module fastener_button_counterbore(size, cls = "clearance") {
    s = _fsz(size);
    asm_counterbore(s[4], s[5], s[0], cls);
}

// Hex nut trap (ISO 4032 across-flats): pocket opening at z=0, extending +Z
// to the nut thickness — subtract from a face whose underside sits at z=0.
module fastener_hex_trap(size, cls = "location") {
    s = _fsz(size);
    asm_hex_nut_trap(s[6], s[7], cls);
}

// Square nut trap (DIN 562 side): same orientation as the hex trap.
module fastener_square_trap(size, cls = "location") {
    s = _fsz(size);
    asm_square_nut_trap(s[8], s[9], cls);
}

// Heat-set insert boss (MALE). Base at z=0, growing +Z.
module fastener_insert_boss(size, wall = 2.4, cls = "snug") {
    s = _fsz(size);
    asm_insert_boss(s[10], s[11], wall, cls);
}
// main file
// ============================================================================
// test.scad — assertion fixture for iso_metric_fasteners
// ----------------------------------------------------------------------------
// One plate exercising every feature at KNOWN positions so spec.json
// assertions can measure them on the compiled STL:
//   x=10 : M3 through hole
//   x=25 : M3 cap-head counterbore (from top)
//   x=40 : M4 button-head counterbore (from top)
//   x=55 : M3 hex nut trap (from bottom)
//   x=68 : M4 square nut trap (from bottom)
//   x=82 : M4 heat-set insert boss standing on top
// Spacings between through-shanks at z=4: 10 → 25 → 40 = 15 mm pitch.

use <iso_metric_fasteners.scad>;

$fn = 48;

PLATE_W = 90;
PLATE_D = 30;
PLATE_T = 8;

module test_plate() {
    difference() {
        cube([PLATE_W, PLATE_D, PLATE_T]);
        // through holes + counterbores cut from the top
        translate([10, PLATE_D / 2, 0]) fastener_through_hole("m3");
        translate([25, PLATE_D / 2, 0]) fastener_cap_counterbore("m3");
        translate([40, PLATE_D / 2, 0]) fastener_button_counterbore("m4");
        // nut traps cut from the bottom face (z=0 plane of the plate)
        translate([55, PLATE_D / 2, 0]) fastener_hex_trap("m3");
        translate([68, PLATE_D / 2, 0]) fastener_square_trap("m4");
    }
    // boss stands on the top surface
    translate([82, PLATE_D / 2, PLATE_T]) fastener_insert_boss("m4");
}

test_plate();
